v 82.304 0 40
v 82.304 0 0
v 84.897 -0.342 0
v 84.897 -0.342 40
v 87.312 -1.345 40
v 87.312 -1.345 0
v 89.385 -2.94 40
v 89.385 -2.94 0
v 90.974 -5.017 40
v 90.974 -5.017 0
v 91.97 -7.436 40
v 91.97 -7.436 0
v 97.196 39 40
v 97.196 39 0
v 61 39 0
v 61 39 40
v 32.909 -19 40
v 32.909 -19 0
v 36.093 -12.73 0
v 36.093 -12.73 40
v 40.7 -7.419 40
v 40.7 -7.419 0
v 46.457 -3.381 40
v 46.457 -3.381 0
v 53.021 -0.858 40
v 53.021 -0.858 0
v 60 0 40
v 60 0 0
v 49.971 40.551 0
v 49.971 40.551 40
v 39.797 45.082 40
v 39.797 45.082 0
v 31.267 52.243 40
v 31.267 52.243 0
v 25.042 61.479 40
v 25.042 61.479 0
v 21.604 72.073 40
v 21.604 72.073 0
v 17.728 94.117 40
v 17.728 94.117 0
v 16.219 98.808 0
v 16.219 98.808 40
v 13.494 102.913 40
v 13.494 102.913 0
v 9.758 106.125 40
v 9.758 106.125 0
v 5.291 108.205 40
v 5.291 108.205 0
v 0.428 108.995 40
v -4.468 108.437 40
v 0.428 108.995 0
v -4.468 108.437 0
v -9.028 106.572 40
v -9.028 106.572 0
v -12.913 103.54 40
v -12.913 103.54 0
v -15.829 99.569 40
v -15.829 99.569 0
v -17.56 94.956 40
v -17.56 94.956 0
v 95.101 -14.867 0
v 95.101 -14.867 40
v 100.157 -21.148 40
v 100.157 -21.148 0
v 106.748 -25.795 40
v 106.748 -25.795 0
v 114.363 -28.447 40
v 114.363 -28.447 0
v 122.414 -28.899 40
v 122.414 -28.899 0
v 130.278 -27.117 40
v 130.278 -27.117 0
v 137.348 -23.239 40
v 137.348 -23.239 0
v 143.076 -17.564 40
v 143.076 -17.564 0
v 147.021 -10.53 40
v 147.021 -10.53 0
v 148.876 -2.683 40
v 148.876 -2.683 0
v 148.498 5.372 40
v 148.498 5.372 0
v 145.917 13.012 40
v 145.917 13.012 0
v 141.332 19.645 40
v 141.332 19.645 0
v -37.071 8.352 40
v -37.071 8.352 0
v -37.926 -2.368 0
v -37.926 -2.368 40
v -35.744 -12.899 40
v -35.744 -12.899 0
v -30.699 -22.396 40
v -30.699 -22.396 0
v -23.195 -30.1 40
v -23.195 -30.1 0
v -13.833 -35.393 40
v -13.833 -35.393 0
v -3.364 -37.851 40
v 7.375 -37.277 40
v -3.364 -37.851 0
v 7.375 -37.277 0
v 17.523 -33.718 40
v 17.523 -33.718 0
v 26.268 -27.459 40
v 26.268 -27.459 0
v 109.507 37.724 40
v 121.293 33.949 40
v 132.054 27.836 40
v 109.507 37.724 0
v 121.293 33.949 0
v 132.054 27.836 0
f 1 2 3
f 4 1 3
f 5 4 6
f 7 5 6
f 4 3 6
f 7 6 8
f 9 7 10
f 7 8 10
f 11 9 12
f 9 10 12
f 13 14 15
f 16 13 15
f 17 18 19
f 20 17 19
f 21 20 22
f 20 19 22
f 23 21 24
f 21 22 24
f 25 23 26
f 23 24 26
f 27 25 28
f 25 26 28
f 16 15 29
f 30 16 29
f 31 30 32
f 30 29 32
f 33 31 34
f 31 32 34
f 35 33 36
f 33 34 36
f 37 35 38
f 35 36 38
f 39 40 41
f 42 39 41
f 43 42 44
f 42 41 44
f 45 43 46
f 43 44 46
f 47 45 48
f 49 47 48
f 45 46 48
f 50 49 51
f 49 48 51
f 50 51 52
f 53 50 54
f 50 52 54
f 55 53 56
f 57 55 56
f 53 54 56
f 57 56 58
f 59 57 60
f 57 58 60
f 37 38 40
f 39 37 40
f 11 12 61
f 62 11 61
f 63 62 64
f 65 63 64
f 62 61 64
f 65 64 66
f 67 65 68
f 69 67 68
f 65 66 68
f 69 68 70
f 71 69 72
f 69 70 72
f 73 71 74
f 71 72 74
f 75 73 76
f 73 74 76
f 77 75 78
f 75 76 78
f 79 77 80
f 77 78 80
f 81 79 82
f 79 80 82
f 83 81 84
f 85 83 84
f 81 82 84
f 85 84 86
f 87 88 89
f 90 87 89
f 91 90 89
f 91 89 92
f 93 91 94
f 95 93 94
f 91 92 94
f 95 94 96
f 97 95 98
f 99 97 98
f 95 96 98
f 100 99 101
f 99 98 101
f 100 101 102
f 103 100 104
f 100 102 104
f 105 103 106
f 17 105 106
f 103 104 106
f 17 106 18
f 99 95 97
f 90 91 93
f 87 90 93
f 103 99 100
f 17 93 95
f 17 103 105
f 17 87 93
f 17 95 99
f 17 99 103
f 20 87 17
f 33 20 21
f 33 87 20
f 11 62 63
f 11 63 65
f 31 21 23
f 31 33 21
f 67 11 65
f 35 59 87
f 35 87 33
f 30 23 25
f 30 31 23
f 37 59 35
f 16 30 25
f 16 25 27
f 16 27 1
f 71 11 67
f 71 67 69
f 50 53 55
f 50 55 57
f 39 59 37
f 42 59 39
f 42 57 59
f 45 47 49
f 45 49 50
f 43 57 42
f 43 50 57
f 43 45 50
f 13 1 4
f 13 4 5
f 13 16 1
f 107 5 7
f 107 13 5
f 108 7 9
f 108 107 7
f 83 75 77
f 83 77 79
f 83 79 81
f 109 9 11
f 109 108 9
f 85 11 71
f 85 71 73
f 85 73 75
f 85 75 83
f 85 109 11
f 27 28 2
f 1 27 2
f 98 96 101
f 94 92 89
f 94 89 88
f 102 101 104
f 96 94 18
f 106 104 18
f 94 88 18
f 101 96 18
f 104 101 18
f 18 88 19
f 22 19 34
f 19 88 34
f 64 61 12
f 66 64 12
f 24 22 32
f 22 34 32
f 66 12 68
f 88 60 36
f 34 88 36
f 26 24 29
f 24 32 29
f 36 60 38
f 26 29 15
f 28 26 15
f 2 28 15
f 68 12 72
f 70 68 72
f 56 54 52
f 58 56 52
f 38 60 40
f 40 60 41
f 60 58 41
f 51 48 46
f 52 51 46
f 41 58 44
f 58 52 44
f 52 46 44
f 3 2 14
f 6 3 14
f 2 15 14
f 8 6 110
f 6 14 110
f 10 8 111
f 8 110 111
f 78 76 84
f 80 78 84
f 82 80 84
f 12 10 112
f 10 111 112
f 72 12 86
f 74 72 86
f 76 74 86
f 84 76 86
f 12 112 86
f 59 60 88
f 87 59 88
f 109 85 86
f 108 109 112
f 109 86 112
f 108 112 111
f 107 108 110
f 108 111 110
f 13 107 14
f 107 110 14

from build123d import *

# Parameters (mm, degrees)
F1_DEPTH = 40


with BuildPart() as f1:
    # F0 (on Top) → F1 (new body)
    with BuildSketch(Plane.XY):
        with BuildLine():
            Line((-17.559889, 94.956044), (-37.070878, 8.351648))
            ThreePointArc((-37.070878, 8.351648), (-13.833241, -35.392675), (32.908965, -19))
            ThreePointArc((32.908965, -19), (43.455181, -5.223464), (60, 0))
            Line((60, 0), (82.303846, 0))
            ThreePointArc((82.303846, 0), (88.401345, -2.074061), (91.969527, -7.435897))
            ThreePointArc((91.969527, -7.435897), (133.948558, -25.42514), (141.332314, 19.645161))
            ThreePointArc((141.332314, 19.645161), (121.293071, 33.948656), (97.196491, 39))
            Line((97.196491, 39), (61, 39))
            ThreePointArc((61, 39), (35.28131, 48.364253), (21.604436, 72.072551))
            Line((21.604436, 72.072551), (17.728004, 94.117352))
            ThreePointArc((17.728004, 94.117352), (0.427687, 108.994918), (-17.559889, 94.956044))
        make_face()
    extrude(amount=F1_DEPTH)


solid = f1.part
